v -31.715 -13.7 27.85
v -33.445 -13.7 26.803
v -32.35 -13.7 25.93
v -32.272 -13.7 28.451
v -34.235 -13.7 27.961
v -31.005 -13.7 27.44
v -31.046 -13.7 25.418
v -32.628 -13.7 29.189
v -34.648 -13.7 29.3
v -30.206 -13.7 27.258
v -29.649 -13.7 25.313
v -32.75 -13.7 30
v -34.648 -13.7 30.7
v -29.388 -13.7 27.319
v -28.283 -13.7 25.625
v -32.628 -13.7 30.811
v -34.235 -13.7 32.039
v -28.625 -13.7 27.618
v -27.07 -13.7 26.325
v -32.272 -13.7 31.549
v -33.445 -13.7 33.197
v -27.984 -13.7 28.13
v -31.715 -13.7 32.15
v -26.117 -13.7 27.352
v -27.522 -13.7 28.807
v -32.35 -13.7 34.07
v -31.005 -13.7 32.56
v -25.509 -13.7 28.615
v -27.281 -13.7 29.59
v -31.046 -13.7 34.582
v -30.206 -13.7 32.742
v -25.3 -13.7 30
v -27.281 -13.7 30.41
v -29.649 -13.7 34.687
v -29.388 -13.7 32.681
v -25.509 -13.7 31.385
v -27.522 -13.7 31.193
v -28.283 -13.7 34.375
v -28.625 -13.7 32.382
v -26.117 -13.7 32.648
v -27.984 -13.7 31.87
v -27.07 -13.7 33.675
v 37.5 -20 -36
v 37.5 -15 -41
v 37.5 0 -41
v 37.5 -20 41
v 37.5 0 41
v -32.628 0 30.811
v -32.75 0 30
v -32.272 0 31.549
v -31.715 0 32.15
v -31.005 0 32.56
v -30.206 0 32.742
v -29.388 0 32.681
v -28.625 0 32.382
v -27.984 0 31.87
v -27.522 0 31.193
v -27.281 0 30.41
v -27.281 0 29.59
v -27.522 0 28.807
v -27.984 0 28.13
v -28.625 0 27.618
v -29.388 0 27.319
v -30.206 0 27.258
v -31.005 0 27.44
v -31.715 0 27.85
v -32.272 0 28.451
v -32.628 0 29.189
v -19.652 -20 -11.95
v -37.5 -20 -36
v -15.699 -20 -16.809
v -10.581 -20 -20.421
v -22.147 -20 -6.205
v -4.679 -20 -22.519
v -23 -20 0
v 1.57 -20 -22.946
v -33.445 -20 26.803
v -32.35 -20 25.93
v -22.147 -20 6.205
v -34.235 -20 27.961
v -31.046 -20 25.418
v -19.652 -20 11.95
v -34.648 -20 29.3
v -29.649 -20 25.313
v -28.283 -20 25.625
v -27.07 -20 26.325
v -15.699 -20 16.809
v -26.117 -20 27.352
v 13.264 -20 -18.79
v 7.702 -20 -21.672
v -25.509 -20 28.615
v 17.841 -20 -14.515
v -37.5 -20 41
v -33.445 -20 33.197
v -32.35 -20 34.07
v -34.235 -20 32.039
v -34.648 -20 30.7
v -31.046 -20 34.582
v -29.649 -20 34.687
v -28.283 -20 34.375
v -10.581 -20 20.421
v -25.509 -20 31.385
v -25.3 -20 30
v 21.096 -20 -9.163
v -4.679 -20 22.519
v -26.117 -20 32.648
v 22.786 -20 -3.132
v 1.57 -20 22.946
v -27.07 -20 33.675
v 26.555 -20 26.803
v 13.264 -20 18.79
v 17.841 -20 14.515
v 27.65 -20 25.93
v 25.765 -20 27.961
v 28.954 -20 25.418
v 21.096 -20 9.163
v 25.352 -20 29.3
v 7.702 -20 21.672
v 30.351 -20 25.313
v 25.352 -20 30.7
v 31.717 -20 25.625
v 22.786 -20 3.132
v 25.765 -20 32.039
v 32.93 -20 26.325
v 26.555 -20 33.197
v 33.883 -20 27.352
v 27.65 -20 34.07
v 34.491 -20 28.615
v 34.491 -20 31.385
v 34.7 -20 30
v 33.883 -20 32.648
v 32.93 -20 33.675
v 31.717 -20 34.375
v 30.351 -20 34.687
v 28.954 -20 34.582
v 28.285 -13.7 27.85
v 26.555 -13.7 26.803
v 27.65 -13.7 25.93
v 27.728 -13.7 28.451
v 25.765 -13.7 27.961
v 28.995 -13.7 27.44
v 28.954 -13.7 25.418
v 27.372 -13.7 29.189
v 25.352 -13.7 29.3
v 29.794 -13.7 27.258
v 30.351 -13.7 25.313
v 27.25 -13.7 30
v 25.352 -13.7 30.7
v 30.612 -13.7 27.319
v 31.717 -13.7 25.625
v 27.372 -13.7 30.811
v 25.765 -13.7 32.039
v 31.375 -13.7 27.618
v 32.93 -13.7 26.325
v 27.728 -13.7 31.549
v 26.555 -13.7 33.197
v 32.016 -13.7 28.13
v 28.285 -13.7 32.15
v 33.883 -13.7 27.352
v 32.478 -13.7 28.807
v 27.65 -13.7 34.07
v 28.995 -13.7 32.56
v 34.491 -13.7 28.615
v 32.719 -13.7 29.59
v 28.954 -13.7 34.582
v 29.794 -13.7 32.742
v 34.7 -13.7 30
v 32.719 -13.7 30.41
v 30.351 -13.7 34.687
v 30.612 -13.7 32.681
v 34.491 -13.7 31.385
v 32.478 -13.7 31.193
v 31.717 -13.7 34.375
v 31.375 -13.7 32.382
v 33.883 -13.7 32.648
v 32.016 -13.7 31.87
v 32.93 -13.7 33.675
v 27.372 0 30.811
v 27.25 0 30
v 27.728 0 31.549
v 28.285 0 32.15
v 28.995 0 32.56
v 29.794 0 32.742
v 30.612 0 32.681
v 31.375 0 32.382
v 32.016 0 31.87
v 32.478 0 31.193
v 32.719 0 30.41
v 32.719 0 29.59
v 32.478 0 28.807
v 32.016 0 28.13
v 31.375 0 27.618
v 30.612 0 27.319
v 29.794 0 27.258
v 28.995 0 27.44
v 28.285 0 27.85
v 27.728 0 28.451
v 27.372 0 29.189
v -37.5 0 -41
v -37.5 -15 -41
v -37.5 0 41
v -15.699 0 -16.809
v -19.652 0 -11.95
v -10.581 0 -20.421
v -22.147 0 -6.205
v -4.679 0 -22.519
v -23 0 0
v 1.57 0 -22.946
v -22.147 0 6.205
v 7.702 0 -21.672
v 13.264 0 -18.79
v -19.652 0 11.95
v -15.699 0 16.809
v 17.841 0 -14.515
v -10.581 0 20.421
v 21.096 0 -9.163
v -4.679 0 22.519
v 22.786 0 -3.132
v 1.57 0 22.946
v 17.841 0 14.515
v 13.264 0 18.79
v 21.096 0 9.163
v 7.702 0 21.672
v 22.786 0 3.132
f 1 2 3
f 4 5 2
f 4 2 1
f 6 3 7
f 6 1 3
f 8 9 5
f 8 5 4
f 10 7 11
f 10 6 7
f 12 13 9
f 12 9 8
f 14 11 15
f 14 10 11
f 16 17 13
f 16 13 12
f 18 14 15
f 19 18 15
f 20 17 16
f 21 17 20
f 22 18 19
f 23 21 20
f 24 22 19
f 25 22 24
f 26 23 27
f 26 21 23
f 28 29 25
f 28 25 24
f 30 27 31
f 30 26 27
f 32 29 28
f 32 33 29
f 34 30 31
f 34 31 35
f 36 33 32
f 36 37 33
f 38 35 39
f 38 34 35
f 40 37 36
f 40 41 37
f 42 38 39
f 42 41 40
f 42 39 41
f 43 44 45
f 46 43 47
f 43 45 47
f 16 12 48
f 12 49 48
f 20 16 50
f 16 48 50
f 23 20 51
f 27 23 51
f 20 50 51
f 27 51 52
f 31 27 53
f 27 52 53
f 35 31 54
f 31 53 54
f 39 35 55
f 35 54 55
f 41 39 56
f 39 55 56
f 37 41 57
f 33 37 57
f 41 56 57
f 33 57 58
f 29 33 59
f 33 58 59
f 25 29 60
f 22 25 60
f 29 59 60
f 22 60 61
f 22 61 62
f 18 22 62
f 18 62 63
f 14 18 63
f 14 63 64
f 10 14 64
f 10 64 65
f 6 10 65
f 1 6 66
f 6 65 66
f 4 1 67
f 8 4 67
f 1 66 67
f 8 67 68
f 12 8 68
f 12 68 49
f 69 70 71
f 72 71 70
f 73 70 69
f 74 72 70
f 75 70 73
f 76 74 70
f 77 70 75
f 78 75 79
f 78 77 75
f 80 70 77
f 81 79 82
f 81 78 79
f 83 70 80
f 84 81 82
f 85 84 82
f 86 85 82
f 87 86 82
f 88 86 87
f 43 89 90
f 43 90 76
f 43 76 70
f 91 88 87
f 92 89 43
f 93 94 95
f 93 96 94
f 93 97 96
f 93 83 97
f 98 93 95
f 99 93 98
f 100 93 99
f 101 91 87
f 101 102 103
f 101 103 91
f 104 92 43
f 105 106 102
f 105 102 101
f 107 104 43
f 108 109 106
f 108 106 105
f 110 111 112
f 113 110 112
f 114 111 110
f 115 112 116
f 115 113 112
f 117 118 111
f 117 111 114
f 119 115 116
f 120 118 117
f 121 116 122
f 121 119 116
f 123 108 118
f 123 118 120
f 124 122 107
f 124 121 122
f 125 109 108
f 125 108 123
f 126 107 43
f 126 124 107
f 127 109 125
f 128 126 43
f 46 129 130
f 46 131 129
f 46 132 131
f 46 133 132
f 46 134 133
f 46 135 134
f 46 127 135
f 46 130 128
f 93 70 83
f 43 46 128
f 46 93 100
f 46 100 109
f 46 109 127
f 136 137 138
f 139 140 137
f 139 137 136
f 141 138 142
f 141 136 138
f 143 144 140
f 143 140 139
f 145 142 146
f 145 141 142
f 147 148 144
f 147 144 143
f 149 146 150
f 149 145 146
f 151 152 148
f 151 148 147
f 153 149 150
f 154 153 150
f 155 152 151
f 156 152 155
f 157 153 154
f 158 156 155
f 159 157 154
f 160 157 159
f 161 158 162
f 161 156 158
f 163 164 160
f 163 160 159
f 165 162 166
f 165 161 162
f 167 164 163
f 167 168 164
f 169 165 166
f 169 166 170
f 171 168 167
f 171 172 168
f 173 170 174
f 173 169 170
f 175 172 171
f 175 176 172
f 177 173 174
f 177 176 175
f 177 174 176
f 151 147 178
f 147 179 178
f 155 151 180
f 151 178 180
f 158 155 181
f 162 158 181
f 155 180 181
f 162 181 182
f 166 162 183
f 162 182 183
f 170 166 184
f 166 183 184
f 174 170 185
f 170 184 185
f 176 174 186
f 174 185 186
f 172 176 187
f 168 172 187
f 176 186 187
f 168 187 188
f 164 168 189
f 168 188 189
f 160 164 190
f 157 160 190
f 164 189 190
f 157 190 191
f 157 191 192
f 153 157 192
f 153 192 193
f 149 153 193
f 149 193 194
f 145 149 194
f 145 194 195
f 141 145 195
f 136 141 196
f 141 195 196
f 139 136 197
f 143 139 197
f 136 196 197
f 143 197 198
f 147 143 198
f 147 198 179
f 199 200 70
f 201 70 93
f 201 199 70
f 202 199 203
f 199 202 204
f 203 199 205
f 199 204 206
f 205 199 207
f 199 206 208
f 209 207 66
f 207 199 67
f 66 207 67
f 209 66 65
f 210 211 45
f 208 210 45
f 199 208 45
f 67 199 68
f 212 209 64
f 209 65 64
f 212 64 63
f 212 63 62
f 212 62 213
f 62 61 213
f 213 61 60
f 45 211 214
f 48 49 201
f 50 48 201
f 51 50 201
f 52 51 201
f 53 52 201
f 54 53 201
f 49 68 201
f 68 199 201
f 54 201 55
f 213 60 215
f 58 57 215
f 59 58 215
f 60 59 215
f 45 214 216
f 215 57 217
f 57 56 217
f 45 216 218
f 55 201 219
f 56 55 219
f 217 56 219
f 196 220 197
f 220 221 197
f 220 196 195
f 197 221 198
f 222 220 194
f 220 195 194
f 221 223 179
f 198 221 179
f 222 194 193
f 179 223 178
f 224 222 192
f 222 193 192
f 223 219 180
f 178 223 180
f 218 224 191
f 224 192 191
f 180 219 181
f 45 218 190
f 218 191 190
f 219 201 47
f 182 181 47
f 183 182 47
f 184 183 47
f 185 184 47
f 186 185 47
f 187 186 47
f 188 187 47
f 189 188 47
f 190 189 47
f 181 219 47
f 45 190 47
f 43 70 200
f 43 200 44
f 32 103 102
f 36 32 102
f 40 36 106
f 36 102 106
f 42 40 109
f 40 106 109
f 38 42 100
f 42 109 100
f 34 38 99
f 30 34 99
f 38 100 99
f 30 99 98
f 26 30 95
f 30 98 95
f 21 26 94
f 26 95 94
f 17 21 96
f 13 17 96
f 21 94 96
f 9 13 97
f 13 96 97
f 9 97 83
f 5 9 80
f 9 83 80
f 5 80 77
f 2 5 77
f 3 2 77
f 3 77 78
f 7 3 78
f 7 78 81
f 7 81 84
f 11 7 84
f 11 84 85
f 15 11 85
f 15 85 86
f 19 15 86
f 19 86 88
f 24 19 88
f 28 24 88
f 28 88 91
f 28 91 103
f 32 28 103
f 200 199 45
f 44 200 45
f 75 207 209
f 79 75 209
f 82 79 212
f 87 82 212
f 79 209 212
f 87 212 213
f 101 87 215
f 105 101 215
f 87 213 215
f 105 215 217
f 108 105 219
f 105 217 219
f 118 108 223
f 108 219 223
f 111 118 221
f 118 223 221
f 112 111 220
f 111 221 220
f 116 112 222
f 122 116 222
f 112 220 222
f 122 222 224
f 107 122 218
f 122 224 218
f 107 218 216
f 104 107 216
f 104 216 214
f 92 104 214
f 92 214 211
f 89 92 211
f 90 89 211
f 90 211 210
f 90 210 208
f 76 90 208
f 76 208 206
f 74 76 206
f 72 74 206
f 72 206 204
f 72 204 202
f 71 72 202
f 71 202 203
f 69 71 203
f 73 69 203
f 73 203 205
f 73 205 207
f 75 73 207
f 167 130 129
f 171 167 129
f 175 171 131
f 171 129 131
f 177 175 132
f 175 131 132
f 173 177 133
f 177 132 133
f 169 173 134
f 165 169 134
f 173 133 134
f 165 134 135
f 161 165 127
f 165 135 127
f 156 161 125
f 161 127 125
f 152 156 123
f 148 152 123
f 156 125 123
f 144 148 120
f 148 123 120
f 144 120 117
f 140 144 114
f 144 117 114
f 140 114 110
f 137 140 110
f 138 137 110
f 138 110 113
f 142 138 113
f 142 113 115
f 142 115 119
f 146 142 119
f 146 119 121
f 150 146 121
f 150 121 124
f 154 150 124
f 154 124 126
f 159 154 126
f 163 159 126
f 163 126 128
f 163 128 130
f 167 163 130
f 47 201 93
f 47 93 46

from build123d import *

# Parameters (mm, degrees)
F0_W           = 75
F0_H           = 82
F1_DEPTH       = 20
F3_D           = 46
F4_D           = 5.5
F4_CBORE_D     = 9.4
F4_CBORE_DEPTH = 6.3
F5_SIZE        = 5


with BuildPart() as f1:
    # F0 (on Front) → F1 (new body)
    with BuildSketch(Plane.XZ):
        Rectangle(F0_W, F0_H)
    extrude(amount=F1_DEPTH)

    # F3 (through all)
    with Locations(Plane.XZ.offset(20)):
        with Locations((0, 0)):
            Hole(F3_D / 2)

    # F4 (through all)
    with Locations(Plane.XZ.offset(20)):
        with Locations((-30, 30), (30, 30)):
            CounterBoreHole(F4_D / 2, F4_CBORE_D / 2, F4_CBORE_DEPTH)

    # F5
    f5_edges = [f1.edges().sort_by_distance(p)[0] for p in [
        (0, -20, -41),
    ]]
    chamfer(f5_edges, length=F5_SIZE)


solid = f1.part
